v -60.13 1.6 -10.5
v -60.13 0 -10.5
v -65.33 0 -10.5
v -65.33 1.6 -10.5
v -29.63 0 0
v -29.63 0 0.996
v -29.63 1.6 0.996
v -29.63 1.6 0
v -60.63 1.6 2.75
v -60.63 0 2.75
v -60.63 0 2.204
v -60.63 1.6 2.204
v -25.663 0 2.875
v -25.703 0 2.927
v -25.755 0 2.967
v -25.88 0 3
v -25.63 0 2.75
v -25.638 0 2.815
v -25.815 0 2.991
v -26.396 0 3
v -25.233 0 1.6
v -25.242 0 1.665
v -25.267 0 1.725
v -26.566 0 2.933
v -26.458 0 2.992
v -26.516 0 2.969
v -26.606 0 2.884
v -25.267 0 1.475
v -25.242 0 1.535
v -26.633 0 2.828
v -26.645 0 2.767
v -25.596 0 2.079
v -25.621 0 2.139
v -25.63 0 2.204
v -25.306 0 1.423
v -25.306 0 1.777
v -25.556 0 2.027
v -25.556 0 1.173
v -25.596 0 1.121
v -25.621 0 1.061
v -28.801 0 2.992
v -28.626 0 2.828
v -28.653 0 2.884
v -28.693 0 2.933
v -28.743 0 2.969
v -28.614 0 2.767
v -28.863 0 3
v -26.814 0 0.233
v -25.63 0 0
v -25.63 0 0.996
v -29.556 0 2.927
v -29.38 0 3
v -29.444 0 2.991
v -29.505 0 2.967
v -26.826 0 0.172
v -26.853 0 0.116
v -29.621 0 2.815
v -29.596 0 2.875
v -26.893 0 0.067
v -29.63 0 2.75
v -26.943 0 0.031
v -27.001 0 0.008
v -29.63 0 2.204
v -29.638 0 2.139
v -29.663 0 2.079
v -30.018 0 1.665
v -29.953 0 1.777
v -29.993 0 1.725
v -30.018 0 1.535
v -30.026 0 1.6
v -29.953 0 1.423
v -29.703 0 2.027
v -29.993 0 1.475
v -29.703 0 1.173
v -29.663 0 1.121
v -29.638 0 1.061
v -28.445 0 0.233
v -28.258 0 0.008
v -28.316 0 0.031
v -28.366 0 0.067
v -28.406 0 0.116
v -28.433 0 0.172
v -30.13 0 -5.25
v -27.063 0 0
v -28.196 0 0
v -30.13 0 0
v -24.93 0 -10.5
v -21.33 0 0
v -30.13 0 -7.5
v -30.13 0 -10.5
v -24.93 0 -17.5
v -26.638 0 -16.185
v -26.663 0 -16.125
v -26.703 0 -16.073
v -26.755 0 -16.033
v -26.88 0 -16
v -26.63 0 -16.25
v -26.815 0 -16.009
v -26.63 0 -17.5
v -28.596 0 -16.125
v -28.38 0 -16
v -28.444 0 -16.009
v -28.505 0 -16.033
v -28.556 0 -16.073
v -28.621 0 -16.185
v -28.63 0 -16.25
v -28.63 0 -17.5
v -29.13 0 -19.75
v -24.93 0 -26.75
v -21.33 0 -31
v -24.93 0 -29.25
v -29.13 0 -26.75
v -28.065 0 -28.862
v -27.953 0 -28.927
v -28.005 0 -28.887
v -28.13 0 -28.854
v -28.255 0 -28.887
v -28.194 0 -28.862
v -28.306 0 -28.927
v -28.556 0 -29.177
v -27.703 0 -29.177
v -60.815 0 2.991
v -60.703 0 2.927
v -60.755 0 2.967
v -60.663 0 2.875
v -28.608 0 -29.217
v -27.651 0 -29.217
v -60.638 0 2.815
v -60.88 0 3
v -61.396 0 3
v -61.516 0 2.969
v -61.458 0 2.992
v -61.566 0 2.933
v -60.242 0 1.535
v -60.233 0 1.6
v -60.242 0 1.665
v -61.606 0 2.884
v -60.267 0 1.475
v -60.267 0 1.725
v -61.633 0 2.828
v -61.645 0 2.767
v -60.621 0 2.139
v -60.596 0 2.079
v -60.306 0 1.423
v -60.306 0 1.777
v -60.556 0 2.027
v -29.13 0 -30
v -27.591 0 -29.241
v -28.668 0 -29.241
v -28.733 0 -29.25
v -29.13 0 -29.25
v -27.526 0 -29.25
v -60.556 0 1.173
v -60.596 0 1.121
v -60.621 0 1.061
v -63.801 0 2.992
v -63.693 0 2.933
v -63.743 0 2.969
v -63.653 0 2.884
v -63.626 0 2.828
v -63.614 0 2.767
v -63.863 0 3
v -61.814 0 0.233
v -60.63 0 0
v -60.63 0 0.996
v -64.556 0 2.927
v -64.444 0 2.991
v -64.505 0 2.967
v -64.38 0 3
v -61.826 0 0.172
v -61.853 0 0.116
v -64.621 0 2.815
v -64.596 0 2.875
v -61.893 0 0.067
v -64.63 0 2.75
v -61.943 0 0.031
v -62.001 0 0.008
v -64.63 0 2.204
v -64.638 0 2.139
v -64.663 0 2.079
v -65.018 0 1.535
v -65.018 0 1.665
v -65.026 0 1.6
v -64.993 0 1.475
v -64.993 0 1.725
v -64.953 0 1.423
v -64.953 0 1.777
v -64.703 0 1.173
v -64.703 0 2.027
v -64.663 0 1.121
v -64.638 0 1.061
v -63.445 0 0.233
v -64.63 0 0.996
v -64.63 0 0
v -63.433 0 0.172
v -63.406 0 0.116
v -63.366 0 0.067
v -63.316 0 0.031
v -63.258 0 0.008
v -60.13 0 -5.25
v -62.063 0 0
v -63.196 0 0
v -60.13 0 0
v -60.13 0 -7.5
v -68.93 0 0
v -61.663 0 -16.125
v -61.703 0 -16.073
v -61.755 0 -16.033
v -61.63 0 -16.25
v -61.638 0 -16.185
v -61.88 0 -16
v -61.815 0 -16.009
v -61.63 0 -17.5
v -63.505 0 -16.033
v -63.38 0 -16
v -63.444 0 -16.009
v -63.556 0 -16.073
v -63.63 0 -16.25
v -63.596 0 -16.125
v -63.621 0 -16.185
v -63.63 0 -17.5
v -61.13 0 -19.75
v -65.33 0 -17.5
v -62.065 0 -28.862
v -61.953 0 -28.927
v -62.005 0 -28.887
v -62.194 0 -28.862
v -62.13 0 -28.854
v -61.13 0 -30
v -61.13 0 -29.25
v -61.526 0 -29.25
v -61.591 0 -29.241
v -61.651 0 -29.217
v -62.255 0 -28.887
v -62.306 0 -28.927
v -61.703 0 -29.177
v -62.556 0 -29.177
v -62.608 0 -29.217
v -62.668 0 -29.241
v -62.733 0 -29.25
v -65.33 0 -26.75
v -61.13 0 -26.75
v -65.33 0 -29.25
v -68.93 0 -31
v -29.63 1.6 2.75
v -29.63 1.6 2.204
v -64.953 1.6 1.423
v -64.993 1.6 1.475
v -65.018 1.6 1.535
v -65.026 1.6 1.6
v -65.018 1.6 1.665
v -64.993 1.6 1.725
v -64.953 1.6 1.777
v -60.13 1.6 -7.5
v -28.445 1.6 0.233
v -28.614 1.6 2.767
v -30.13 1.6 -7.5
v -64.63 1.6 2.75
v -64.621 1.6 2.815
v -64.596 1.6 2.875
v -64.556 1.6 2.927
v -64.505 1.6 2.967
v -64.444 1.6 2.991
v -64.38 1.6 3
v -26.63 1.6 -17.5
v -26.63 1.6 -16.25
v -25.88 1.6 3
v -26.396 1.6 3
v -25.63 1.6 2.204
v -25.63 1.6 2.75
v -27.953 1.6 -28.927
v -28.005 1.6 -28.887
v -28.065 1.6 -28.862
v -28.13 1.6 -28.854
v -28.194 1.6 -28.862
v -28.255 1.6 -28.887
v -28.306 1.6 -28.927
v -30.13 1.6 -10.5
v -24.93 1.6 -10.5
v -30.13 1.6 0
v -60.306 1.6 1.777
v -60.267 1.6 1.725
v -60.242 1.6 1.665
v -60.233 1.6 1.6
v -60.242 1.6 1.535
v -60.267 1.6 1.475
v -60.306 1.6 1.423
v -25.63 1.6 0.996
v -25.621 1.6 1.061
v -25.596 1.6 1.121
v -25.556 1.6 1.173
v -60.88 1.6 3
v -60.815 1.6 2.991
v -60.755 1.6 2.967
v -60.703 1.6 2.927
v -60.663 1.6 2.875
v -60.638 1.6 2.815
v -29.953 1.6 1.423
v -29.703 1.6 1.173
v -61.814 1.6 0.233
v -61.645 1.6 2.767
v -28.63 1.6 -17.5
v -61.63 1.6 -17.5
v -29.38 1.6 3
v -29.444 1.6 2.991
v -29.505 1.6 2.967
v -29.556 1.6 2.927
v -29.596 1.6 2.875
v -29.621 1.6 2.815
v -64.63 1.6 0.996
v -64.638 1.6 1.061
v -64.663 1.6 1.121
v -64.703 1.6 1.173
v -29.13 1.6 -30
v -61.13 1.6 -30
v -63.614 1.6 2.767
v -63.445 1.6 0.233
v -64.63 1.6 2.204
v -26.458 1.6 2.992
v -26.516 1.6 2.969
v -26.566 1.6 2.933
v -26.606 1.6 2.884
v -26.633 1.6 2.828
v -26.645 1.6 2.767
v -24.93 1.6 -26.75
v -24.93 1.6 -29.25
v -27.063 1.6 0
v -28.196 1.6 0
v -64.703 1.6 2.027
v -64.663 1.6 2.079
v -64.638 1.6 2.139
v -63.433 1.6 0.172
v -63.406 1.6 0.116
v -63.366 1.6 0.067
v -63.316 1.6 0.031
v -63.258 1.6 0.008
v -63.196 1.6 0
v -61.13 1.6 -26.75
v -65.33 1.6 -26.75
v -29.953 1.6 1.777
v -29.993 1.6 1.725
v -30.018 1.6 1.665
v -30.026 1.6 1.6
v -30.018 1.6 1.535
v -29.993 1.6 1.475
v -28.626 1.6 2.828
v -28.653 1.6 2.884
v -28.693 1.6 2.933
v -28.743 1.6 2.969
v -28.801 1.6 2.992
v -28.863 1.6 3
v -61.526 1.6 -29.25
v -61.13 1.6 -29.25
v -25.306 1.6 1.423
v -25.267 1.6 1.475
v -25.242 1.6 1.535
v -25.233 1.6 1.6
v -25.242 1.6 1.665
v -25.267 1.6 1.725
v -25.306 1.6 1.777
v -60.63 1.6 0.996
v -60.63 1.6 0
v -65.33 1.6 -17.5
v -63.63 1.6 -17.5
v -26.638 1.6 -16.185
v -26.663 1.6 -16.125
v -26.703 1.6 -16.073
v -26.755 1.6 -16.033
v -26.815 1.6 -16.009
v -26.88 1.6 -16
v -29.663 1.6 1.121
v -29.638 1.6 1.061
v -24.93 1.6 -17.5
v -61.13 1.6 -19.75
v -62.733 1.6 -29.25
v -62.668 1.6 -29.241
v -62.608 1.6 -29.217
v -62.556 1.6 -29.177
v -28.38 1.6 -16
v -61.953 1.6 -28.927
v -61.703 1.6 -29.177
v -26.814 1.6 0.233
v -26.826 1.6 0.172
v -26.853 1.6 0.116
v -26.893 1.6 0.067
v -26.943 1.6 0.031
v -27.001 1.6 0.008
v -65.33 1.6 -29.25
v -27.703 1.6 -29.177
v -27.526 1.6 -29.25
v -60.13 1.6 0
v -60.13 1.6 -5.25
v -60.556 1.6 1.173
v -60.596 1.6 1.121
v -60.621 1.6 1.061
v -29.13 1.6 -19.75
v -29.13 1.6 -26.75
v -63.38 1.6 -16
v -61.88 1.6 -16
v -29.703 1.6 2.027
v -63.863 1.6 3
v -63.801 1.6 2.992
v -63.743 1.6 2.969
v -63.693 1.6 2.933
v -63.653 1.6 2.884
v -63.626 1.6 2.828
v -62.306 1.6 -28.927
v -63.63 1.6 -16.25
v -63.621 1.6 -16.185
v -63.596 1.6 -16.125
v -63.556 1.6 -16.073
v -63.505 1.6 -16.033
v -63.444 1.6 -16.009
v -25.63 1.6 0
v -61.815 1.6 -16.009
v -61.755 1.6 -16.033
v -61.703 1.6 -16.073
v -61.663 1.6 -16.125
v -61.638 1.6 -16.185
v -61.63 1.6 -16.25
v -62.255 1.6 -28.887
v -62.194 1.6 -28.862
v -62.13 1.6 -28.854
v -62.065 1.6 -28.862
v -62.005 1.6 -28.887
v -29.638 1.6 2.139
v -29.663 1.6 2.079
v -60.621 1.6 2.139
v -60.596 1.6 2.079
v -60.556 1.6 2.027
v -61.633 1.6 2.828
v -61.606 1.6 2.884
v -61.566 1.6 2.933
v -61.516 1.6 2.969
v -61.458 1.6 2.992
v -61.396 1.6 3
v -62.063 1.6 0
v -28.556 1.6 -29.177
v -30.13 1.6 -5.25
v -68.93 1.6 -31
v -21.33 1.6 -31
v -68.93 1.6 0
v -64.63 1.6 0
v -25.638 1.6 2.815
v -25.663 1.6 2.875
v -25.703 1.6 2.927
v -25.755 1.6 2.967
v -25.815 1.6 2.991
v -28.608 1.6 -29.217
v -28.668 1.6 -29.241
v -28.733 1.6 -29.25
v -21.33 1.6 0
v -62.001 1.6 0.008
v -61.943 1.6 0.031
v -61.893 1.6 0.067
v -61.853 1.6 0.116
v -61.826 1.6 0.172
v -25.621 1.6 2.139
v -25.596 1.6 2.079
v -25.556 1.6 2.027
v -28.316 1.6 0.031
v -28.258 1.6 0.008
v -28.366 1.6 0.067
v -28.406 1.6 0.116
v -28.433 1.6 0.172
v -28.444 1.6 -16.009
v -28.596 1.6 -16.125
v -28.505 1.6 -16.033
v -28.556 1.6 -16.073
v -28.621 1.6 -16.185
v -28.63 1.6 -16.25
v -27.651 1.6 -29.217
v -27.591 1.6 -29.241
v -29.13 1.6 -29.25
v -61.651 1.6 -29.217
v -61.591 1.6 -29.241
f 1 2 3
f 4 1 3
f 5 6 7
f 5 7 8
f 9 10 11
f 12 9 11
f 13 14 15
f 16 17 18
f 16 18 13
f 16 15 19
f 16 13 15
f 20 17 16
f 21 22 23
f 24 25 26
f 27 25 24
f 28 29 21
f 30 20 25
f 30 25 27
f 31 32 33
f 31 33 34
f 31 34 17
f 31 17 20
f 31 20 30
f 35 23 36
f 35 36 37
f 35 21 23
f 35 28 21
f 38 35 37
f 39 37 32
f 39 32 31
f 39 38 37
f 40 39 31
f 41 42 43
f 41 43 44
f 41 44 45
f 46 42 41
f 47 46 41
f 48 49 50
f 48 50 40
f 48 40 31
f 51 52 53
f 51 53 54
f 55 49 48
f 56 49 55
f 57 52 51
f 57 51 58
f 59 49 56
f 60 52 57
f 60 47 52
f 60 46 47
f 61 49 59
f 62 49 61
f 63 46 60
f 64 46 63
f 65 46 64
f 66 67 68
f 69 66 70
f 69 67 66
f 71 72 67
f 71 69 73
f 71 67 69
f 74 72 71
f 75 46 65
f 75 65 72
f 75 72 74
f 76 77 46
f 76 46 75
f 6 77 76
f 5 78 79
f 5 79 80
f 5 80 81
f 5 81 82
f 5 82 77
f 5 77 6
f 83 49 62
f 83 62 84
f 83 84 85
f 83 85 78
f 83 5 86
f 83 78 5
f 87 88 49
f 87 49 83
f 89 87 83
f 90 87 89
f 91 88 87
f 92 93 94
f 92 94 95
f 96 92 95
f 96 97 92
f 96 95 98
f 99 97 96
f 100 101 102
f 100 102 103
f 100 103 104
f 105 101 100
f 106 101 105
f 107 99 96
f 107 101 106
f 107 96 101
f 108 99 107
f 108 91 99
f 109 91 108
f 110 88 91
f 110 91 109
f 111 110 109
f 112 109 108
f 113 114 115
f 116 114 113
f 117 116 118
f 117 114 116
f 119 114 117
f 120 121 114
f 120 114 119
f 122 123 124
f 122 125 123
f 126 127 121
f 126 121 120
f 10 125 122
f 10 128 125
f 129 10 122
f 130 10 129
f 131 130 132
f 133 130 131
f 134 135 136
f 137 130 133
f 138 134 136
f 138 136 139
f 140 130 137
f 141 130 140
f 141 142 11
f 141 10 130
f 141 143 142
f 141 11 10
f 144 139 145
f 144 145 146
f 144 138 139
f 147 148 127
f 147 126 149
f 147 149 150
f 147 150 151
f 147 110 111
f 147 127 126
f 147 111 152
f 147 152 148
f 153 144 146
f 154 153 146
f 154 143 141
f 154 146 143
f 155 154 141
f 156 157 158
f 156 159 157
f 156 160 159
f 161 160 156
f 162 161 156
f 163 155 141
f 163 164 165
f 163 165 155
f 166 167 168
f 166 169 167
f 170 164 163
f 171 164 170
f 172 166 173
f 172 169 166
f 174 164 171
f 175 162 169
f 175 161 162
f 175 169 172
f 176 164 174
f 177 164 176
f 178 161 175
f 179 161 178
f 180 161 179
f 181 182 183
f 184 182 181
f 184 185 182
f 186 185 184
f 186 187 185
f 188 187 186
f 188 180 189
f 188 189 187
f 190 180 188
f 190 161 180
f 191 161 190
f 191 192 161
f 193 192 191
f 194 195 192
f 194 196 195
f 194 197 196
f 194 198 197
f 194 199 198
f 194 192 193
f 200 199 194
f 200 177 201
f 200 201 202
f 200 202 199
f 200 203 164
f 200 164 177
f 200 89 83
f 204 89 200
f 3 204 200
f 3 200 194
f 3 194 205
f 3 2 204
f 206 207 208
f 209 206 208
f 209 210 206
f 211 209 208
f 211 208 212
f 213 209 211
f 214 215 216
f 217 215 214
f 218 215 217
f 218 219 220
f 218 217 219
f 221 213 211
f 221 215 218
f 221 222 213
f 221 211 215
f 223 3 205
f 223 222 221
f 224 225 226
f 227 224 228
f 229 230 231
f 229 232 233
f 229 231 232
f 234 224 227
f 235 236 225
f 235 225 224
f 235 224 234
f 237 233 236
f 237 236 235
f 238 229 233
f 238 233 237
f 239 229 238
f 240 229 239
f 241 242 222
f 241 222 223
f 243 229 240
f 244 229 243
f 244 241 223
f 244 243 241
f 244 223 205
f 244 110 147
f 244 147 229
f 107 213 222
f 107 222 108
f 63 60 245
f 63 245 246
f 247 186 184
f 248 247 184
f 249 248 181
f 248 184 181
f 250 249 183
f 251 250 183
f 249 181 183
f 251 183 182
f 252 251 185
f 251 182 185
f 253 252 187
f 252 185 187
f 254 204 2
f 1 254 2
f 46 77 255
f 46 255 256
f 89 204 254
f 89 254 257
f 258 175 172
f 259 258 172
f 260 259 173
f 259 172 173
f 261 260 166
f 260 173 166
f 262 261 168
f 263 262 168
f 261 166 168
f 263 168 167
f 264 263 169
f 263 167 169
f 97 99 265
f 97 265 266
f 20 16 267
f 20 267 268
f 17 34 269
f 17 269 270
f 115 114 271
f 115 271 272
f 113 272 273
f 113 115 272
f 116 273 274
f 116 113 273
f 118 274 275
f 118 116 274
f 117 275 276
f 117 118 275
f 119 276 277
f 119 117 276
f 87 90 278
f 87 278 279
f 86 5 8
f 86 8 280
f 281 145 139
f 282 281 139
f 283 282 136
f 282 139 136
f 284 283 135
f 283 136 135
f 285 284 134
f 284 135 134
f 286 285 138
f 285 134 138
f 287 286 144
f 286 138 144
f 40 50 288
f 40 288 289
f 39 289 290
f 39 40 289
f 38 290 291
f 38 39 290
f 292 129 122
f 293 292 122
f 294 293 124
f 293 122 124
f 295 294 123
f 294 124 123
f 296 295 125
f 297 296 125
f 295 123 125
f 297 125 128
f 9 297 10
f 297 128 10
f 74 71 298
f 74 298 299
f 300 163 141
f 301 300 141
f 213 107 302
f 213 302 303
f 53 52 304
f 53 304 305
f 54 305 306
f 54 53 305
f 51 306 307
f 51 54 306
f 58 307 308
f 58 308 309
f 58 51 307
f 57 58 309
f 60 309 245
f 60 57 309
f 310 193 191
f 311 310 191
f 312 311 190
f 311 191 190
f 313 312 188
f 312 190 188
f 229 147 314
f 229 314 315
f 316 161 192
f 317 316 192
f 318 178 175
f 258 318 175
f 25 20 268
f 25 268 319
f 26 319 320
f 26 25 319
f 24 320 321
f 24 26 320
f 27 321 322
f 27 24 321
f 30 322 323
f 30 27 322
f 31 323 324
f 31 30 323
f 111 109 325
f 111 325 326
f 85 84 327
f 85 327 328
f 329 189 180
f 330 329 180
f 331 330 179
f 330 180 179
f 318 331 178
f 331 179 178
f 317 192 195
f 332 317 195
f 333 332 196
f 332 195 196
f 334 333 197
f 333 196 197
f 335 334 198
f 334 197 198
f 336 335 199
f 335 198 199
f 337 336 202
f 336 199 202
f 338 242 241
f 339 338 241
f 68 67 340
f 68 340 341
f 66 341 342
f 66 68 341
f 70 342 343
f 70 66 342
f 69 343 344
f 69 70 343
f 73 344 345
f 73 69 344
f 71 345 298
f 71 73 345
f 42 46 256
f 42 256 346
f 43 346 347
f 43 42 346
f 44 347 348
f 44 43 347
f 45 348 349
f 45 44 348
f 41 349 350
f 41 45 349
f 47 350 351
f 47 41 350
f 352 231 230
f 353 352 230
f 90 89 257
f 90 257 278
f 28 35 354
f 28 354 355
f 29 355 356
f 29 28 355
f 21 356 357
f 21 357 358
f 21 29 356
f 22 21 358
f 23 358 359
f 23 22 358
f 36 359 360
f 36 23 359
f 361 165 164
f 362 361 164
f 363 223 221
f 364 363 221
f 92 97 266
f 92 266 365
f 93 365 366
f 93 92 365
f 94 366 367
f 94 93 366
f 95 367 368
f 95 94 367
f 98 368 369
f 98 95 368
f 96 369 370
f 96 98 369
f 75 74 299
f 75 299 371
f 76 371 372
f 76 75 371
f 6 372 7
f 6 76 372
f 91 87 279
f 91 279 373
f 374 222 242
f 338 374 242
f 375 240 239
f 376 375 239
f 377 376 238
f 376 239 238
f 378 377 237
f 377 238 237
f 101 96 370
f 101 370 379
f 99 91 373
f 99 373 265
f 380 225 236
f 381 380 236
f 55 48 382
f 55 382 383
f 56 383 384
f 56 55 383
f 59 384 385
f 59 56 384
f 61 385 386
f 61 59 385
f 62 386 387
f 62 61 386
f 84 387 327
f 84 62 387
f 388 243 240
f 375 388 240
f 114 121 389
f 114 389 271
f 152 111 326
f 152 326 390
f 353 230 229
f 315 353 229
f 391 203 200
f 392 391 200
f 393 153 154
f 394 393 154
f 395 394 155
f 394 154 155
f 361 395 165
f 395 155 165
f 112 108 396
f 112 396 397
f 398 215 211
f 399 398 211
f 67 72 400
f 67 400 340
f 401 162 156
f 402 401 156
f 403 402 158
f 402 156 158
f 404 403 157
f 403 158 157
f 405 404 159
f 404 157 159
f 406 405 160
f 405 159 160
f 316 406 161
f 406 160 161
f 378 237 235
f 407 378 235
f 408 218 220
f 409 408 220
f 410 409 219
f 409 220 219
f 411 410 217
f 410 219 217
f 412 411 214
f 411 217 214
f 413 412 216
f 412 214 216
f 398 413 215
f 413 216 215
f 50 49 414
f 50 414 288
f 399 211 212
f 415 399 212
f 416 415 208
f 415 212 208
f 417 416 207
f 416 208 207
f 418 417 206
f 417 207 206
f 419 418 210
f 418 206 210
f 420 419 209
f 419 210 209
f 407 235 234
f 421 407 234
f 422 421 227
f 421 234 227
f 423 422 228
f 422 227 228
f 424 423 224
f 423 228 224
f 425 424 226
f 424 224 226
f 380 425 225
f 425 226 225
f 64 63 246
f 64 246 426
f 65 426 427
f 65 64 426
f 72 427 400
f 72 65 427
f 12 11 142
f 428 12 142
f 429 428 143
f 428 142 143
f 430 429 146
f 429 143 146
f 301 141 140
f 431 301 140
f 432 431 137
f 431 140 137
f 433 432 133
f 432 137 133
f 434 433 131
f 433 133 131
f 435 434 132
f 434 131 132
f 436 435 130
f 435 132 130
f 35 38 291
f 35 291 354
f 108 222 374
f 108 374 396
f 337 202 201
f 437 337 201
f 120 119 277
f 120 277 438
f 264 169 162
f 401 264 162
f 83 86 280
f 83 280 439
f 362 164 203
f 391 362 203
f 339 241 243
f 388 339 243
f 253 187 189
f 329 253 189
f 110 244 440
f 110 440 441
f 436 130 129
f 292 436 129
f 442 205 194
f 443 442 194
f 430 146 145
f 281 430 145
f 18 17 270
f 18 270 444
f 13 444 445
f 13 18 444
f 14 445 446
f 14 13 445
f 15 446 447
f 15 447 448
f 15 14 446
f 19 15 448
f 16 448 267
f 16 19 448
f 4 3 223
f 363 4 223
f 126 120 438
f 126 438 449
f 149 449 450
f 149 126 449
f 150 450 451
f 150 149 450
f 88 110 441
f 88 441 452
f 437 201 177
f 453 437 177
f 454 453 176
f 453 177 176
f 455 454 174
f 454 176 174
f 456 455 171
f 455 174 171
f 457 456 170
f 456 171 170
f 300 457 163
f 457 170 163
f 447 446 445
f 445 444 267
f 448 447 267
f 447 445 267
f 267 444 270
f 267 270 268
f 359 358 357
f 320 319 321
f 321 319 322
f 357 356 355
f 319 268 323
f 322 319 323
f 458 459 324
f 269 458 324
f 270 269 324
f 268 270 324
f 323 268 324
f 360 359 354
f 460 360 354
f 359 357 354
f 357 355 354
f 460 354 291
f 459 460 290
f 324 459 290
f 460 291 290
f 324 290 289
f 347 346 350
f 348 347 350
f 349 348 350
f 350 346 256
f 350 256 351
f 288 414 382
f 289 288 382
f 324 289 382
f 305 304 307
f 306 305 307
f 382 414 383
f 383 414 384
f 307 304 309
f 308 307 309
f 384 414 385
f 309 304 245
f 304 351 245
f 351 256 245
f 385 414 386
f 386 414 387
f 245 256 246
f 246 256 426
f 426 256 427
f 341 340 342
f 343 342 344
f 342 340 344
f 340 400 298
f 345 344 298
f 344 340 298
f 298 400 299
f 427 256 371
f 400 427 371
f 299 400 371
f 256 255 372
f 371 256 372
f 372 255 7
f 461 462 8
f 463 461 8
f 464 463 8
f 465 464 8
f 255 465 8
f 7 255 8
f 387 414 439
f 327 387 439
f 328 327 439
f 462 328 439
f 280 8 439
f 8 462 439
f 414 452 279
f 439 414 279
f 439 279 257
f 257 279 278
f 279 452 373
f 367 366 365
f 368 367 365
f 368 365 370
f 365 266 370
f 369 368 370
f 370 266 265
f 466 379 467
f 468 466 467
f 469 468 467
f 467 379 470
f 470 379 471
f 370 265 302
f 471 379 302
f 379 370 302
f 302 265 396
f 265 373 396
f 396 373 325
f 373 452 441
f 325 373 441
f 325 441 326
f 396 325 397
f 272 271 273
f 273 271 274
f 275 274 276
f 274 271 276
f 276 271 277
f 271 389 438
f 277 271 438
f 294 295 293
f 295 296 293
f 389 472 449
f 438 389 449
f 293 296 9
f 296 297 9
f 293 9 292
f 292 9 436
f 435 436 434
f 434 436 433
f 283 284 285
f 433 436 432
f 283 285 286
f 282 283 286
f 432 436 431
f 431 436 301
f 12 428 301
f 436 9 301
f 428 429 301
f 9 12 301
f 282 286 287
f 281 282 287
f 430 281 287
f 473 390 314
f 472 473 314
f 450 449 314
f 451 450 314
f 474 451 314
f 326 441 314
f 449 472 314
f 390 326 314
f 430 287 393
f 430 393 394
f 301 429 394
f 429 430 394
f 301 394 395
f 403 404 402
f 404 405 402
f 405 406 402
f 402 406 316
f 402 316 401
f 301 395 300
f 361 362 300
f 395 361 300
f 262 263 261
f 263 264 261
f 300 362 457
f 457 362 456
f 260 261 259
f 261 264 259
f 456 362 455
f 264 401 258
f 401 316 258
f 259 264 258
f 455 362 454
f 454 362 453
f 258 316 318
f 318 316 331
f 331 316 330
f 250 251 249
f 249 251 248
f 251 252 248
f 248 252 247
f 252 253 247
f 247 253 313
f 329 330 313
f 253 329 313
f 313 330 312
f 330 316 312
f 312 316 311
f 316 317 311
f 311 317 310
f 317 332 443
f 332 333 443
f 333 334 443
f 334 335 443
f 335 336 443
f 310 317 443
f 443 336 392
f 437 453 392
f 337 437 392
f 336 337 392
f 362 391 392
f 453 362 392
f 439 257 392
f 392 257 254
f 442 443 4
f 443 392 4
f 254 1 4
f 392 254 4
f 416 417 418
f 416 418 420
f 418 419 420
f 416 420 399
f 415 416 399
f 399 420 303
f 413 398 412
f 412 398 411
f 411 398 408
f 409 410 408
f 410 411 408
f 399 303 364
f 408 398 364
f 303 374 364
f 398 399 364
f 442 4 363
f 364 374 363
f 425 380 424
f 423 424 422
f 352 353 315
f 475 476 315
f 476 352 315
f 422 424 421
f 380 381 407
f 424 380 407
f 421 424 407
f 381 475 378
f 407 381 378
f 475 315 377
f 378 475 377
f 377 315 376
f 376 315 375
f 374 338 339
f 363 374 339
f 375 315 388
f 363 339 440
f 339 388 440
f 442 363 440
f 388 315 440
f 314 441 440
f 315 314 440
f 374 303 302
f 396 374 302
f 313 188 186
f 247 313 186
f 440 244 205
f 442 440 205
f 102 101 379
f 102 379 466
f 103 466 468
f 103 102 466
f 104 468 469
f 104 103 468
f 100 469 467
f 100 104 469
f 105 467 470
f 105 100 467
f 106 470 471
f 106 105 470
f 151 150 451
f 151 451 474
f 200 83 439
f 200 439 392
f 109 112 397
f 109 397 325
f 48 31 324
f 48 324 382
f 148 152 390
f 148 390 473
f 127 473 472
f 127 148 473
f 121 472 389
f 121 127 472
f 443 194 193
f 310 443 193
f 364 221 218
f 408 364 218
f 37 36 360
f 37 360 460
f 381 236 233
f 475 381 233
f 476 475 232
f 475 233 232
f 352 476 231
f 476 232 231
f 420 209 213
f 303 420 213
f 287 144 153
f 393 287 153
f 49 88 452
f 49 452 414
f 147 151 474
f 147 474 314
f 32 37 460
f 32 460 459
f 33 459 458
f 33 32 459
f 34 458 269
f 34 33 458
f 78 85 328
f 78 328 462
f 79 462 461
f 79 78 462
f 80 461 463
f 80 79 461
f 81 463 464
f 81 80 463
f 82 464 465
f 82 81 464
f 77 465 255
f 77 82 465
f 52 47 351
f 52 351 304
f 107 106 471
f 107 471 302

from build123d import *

# Parameters (mm, degrees)
BOSS_EXTRUDE1_DEPTH = 1.6


with BuildPart() as part:
    # Sketch1 → Boss-Extrude1 (new body)
    with BuildSketch(Plane(origin=(0, 0, 0), x_dir=(1, 0, 0), z_dir=(0, 1, 0))):
        with BuildLine():
            Line((-68.929583289, 0), (-64.629583289, 0))
            Line((-64.629583289, 0), (-64.629583289, -0.996446609))
            ThreePointArc((-64.629583289, -0.996446609), (-64.648613406, -1.092117467), (-64.702806594, -1.173223305))
            Line((-64.702806594, -1.173223305), (-64.952806594, -1.423223305))
            ThreePointArc((-64.952806594, -1.423223305), (-65.026029899, -1.6), (-64.952806594, -1.776776695))
            Line((-64.952806594, -1.776776695), (-64.702806594, -2.026776695))
            ThreePointArc((-64.702806594, -2.026776695), (-64.648613406, -2.107882533), (-64.629583289, -2.203553391))
            Line((-64.629583289, -2.203553391), (-64.629583289, -2.75))
            ThreePointArc((-64.629583289, -2.75), (-64.556359984, -2.926776695), (-64.379583289, -3))
            Line((-64.379583289, -3), (-63.863471562, -3))
            ThreePointArc((-63.863471562, -3), (-63.692675541, -2.932561549), (-63.614025273, -2.766629753))
            Line((-63.614025273, -2.766629753), (-63.445141306, -0.233370247))
            ThreePointArc((-63.445141306, -0.233370247), (-63.366491038, -0.067438451), (-63.195695016, 0))
            Line((-63.195695016, 0), (-62.063471562, 0))
            ThreePointArc((-62.063471562, 0), (-61.892675541, -0.067438451), (-61.814025273, -0.233370247))
            Line((-61.814025273, -0.233370247), (-61.645141306, -2.766629753))
            ThreePointArc((-61.645141306, -2.766629753), (-61.566491038, -2.932561549), (-61.395695016, -3))
            Line((-61.395695016, -3), (-60.879583289, -3))
            ThreePointArc((-60.879583289, -3), (-60.702806594, -2.926776695), (-60.629583289, -2.75))
            Line((-60.629583289, -2.75), (-60.629583289, -2.203553391))
            ThreePointArc((-60.629583289, -2.203553391), (-60.610553172, -2.107882533), (-60.556359984, -2.026776695))
            Line((-60.556359984, -2.026776695), (-60.306359984, -1.776776695))
            ThreePointArc((-60.306359984, -1.776776695), (-60.23313668, -1.6), (-60.306359984, -1.423223305))
            Line((-60.306359984, -1.423223305), (-60.556359984, -1.173223305))
            ThreePointArc((-60.556359984, -1.173223305), (-60.610553172, -1.092117467), (-60.629583289, -0.996446609))
            Line((-60.629583289, -0.996446609), (-60.629583289, 0))
            Line((-60.629583289, 0), (-60.129583289, 0))
            Line((-60.129583289, 0), (-60.129583289, 5.25))
            Line((-60.129583289, 5.25), (-45.129583289, 5.25))
            Line((-45.129583289, 5.25), (-45.129583289, 7.5))
            Line((-45.129583289, 7.5), (-60.129583289, 7.5))
            Line((-60.129583289, 7.5), (-60.129583289, 10.5))
            Line((-60.129583289, 10.5), (-65.329583289, 10.5))
            Line((-65.329583289, 10.5), (-65.329583289, 17.5))
            Line((-65.329583289, 17.5), (-63.629583289, 17.5))
            Line((-63.629583289, 17.5), (-63.629583289, 16.25))
            ThreePointArc((-63.629583289, 16.25), (-63.556359984, 16.073223305), (-63.379583289, 16))
            Line((-63.379583289, 16), (-61.879583289, 16))
            ThreePointArc((-61.879583289, 16), (-61.702806594, 16.073223305), (-61.629583289, 16.25))
            Line((-61.629583289, 16.25), (-61.629583289, 17.5))
            Line((-61.629583289, 17.5), (-45.129583289, 17.5))
            Line((-45.129583289, 17.5), (-45.129583289, 19.75))
            Line((-45.129583289, 19.75), (-61.129583289, 19.75))
            Line((-61.129583289, 19.75), (-61.129583289, 26.75))
            Line((-61.129583289, 26.75), (-65.329583289, 26.75))
            Line((-65.329583289, 26.75), (-65.329583289, 29.25))
            Line((-65.329583289, 29.25), (-62.73313668, 29.25))
            ThreePointArc((-62.73313668, 29.25), (-62.637465822, 29.230969883), (-62.556359984, 29.176776695))
            Line((-62.556359984, 29.176776695), (-62.306359984, 28.926776695))
            ThreePointArc((-62.306359984, 28.926776695), (-62.129583289, 28.853553391), (-61.952806594, 28.926776695))
            Line((-61.952806594, 28.926776695), (-61.702806594, 29.176776695))
            ThreePointArc((-61.702806594, 29.176776695), (-61.621700757, 29.230969883), (-61.526029899, 29.25))
            Line((-61.526029899, 29.25), (-61.129583289, 29.25))
            Line((-61.129583289, 29.25), (-61.129583289, 30))
            Line((-61.129583289, 30), (-45.129583289, 30))
            Line((-45.129583289, 30), (-45.129583289, 31))
            Line((-45.129583289, 31), (-68.929583289, 31))
            Line((-68.929583289, 31), (-68.929583289, 20))
            Line((-68.929583289, 20), (-68.929583289, 0))
        make_face()
    boss_extrude1 = extrude(amount=BOSS_EXTRUDE1_DEPTH)

    # Mirror1: Boss-Extrude1 across plane
    add(boss_extrude1.mirror(Plane(origin=(-45.129583289, 1.6, -31), x_dir=(0, 0, 1), z_dir=(-1, 0, 0))))


solid = part.part
